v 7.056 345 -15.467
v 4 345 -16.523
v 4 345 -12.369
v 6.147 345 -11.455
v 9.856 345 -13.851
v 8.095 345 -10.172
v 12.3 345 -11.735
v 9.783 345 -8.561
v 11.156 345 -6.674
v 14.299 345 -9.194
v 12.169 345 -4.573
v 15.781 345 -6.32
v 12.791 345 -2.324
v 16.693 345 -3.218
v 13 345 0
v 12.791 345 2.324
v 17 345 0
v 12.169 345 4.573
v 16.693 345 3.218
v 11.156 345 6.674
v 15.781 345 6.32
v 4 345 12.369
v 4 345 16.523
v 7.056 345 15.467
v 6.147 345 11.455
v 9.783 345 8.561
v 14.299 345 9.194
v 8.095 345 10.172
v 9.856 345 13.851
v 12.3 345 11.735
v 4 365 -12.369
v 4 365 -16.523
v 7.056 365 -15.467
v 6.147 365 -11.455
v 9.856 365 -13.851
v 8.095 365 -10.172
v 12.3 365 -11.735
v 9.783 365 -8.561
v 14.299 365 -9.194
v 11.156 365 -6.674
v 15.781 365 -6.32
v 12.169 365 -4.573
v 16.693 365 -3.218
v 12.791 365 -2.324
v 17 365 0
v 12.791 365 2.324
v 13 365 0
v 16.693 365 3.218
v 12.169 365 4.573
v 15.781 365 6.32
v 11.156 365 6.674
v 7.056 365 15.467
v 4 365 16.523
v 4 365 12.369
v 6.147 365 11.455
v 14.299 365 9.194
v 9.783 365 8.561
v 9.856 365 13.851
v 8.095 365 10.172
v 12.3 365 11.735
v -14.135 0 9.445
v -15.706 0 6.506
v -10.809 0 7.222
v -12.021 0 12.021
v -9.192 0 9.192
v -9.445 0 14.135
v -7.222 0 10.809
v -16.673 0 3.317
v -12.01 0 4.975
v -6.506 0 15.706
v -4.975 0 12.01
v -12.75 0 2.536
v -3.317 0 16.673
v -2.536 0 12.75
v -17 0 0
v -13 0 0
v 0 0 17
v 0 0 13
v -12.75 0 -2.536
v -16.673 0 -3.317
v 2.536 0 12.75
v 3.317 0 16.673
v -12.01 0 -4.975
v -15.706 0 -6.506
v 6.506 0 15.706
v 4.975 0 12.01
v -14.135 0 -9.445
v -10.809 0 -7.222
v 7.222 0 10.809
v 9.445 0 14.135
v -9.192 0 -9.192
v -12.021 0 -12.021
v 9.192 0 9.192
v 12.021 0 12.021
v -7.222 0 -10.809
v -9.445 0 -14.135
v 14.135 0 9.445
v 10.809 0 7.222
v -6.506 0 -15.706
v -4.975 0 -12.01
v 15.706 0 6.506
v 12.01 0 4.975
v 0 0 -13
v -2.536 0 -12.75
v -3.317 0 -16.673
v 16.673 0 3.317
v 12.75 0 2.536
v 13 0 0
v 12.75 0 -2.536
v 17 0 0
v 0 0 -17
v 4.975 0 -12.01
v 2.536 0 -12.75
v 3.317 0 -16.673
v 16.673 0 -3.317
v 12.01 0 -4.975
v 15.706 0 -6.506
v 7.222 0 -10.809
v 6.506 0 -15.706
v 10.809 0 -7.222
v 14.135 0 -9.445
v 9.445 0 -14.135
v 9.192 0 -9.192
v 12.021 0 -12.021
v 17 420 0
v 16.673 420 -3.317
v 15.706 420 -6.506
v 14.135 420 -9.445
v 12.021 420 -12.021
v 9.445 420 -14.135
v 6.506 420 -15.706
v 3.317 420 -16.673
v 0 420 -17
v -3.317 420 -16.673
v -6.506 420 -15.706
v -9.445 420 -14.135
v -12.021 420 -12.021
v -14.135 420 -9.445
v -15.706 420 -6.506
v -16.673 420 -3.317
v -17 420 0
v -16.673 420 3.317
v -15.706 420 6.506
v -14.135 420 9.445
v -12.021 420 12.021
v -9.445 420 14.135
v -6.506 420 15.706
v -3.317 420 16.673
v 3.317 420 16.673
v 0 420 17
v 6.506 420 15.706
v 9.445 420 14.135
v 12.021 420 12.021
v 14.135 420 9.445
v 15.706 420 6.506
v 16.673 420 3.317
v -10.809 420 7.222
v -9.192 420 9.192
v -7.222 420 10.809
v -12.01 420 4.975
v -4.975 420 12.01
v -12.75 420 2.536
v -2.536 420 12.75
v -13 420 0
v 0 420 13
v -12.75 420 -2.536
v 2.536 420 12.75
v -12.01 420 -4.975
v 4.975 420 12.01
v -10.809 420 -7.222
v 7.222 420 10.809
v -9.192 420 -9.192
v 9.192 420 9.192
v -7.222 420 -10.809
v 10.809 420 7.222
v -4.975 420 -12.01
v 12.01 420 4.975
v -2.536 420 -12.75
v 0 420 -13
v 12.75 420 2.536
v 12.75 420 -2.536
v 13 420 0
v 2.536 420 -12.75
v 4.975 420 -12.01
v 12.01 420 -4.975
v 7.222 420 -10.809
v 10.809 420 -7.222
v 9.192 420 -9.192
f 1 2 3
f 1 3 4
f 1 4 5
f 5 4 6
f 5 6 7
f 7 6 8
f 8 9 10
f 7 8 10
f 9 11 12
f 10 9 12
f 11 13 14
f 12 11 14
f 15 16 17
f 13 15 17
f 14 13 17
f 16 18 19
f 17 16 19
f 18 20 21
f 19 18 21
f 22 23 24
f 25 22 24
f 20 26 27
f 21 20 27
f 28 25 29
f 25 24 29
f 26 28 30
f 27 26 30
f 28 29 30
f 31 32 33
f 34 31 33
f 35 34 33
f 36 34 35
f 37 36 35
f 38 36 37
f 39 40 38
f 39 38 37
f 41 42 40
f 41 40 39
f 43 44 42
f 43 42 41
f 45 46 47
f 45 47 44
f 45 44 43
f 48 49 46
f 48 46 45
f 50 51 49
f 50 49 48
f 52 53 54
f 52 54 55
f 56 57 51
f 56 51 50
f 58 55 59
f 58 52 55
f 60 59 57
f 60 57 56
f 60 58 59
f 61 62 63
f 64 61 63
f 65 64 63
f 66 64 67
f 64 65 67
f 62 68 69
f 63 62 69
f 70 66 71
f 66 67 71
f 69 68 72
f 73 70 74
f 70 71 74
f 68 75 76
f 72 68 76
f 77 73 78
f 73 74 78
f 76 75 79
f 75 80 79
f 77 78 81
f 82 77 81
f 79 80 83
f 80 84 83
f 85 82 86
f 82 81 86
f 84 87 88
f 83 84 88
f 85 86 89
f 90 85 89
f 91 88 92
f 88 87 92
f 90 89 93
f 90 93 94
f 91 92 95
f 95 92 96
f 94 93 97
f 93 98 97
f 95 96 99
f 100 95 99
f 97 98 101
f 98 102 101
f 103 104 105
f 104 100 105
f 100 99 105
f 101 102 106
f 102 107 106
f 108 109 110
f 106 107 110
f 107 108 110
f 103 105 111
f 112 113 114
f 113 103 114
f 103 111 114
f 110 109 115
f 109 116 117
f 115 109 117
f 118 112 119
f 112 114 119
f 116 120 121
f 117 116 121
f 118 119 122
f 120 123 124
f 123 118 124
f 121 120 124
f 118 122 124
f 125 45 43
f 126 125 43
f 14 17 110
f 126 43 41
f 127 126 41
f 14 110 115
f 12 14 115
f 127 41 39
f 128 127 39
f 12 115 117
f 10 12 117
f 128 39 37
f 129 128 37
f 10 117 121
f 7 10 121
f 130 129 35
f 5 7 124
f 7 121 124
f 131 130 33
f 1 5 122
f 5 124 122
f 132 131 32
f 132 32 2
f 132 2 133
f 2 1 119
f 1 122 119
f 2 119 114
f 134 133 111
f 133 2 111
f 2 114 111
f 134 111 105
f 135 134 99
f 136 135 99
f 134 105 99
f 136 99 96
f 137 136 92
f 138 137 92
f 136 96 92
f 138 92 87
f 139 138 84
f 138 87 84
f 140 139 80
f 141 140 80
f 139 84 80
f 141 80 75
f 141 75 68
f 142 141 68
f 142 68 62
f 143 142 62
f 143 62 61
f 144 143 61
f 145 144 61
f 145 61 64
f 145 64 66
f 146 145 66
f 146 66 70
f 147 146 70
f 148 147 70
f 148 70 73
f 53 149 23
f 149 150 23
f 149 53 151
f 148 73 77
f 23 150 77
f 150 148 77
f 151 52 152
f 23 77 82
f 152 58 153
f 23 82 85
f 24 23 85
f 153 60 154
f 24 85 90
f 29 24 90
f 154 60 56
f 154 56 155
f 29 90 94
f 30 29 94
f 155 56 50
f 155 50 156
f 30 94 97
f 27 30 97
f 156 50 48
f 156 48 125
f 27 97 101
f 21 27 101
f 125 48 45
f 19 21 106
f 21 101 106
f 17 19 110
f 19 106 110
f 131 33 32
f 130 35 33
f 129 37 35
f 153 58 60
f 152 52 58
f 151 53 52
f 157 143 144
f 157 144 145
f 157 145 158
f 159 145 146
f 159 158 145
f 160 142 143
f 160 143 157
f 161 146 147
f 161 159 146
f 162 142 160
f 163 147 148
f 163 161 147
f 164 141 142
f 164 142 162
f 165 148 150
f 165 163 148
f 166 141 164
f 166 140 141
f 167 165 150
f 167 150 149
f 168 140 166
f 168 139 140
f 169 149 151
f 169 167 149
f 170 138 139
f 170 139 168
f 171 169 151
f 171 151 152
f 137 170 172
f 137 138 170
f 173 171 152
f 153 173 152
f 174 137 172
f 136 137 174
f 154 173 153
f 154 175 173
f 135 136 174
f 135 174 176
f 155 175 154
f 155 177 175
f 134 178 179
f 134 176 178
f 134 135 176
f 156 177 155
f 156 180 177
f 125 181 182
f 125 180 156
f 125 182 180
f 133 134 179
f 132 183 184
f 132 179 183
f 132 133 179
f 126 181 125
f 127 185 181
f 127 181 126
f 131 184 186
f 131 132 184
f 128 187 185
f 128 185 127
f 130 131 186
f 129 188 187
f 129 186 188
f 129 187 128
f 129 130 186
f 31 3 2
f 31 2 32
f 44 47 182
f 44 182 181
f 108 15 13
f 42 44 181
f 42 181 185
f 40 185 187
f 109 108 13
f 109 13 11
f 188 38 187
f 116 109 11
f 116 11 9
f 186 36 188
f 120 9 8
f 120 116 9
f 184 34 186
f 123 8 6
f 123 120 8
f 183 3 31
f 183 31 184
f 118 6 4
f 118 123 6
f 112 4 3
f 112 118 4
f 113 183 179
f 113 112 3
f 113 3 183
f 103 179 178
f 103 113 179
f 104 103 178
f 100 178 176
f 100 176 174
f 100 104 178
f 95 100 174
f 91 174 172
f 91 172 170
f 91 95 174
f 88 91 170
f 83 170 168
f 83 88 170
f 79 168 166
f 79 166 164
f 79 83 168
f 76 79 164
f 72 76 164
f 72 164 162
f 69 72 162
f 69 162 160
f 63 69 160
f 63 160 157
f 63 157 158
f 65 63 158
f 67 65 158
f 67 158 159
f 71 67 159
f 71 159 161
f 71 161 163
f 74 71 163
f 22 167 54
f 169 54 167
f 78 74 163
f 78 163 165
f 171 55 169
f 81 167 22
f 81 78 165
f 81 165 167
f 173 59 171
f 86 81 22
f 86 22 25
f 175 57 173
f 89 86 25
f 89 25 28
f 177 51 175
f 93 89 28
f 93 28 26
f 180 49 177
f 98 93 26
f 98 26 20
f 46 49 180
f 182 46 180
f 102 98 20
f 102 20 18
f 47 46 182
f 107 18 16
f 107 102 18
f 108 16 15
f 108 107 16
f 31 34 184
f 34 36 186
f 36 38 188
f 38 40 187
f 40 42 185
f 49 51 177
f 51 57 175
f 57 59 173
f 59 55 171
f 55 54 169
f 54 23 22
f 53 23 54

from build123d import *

# Parameters (mm, degrees)
CROQUIS2_R              = 17
CROQUIS2_R_2            = 13
SALIENTE_EXTRUIR1_DEPTH = 420
CROQUIS3_W              = 25
CROQUIS3_H              = 20
CORTAR_EXTRUIR1_DEPTH   = 25


with BuildPart() as part:
    # Croquis2 → Saliente-Extruir1 (new body)
    with BuildSketch(Plane(origin=(0, 0, 0), x_dir=(1, 0, 0), z_dir=(0, 1, 0))):
        Circle(CROQUIS2_R)
        Circle(CROQUIS2_R_2, mode=Mode.SUBTRACT)
    extrude(amount=SALIENTE_EXTRUIR1_DEPTH)

    # Croquis3 → Cortar-Extruir1 (cut, symmetric)
    with BuildSketch(Plane.XY):
        with Locations((16.5, 355)):
            Rectangle(CROQUIS3_W, CROQUIS3_H)
    extrude(amount=CORTAR_EXTRUIR1_DEPTH, both=True, mode=Mode.SUBTRACT)


solid = part.part
